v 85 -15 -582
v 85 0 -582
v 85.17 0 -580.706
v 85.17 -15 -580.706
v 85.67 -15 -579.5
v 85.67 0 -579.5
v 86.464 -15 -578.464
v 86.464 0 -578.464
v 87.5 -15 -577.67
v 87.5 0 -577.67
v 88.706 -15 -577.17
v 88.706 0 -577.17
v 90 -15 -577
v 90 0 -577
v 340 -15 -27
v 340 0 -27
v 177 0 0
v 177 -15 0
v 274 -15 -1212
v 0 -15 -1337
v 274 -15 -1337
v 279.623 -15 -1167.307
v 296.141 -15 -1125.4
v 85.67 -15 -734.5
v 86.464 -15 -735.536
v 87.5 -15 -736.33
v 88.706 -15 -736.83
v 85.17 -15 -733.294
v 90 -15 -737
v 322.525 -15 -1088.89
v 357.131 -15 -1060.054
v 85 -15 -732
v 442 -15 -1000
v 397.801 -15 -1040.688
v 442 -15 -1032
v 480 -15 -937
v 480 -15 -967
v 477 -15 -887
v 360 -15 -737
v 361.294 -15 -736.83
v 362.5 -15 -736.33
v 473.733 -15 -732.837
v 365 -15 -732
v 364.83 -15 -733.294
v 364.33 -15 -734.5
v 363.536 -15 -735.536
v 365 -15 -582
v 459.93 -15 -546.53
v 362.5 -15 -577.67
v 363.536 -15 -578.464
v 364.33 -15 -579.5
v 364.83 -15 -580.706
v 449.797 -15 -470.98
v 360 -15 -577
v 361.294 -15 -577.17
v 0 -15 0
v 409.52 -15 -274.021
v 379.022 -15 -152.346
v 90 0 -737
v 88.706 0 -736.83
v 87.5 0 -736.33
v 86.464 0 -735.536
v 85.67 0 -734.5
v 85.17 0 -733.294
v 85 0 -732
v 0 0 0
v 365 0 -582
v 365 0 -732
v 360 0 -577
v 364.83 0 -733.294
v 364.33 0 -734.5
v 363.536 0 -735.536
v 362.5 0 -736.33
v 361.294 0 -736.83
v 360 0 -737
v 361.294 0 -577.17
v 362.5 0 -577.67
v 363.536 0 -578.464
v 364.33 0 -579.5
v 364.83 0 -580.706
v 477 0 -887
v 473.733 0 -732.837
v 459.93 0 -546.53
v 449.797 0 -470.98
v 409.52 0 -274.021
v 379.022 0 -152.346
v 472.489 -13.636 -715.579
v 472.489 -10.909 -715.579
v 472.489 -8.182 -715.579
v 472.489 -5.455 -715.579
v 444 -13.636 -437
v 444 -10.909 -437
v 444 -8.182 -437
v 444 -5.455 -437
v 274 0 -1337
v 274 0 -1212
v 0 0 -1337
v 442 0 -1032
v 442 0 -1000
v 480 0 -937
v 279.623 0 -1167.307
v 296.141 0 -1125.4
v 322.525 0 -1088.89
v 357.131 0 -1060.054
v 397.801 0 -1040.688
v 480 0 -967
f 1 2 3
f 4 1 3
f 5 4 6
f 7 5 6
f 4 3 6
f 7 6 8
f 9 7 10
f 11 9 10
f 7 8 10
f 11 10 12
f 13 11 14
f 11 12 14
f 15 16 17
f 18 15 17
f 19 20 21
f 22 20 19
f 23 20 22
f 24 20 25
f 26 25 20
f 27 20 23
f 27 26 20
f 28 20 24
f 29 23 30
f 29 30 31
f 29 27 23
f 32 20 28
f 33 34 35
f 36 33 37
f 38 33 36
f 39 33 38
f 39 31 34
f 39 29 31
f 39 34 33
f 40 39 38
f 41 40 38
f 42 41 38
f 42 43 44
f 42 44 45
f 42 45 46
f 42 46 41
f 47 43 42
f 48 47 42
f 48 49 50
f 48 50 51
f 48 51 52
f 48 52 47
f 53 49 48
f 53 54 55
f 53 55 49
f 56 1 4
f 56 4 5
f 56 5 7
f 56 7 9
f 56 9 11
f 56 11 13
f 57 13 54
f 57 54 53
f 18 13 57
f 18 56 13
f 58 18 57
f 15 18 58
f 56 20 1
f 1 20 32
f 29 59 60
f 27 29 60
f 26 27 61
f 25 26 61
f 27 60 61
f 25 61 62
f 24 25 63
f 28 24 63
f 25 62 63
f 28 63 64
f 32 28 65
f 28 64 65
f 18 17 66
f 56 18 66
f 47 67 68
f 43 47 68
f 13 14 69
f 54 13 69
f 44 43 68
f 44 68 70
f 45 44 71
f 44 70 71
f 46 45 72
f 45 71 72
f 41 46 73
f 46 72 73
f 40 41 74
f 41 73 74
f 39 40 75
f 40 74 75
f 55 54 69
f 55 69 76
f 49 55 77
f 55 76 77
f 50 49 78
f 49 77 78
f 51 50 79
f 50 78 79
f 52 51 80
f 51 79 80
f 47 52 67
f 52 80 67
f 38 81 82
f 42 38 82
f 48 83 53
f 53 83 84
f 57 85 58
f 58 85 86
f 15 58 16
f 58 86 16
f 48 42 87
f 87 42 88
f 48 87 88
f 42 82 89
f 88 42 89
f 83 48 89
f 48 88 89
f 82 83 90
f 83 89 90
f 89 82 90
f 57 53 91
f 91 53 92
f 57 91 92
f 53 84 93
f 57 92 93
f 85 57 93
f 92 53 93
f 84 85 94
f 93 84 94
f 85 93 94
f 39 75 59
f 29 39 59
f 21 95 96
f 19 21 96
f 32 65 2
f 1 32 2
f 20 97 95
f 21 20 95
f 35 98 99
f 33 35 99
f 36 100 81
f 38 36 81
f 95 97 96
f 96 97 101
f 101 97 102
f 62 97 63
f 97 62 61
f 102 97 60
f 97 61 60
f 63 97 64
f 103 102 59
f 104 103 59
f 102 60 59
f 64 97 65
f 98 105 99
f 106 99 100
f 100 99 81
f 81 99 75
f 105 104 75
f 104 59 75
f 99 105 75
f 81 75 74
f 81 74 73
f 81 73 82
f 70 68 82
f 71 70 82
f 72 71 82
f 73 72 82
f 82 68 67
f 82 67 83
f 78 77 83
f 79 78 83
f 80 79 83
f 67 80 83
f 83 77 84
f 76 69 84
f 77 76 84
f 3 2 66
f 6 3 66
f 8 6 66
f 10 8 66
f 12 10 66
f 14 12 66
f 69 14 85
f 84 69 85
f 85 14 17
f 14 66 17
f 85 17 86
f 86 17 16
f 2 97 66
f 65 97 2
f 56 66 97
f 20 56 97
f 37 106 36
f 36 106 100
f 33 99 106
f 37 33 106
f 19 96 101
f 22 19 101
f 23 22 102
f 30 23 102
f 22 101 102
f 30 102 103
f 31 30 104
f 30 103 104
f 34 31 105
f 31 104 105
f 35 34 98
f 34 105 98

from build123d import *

# Parameters (mm, degrees)
F1_DEPTH = 15


with BuildPart() as f1:
    # F0 (on Front) → F1 (new body)
    with BuildSketch(Plane.XZ):
        with BuildLine():
            Line((177, 0), (0, 0))
            Line((0, 0), (0, -1337))
            Line((0, -1337), (274, -1337))
            Line((274, -1337), (274, -1212))
            ThreePointArc((274, -1212), (322.5253137442, -1088.8902928279), (442, -1032))
            Line((442, -1032), (442, -1000))
            Line((442, -1000), (480, -967))
            Line((480, -967), (480, -937))
            Line((480, -937), (477, -887))
            add(Edge.make_bspline(
                [(477, -887), (477.3409901345, -865.6929372181), (477.0797844675, -851.0610734518), (476.1022594588, -737.3138139423), (476.5777735361, -793.1899508202), (474.0967013355, -723.7578035301), (464.8329395432, -637.3258006514), (461.2628948716, -536.660924146), (443.9915396348, -436.9186876346), (426.5757756979, -336.5383755873), (399.3587210867, -237.3522036261), (375.4775408132, -133.8744354339), (355.455463807, -69.1251180104), (340, -27)],
                knots=[0, 0, 0, 0, 0.0728496243, 0.1620736999, 0.2013801511, 0.2662309643, 0.3694203367, 0.4725712376, 0.576170853, 0.6801132511, 0.7847115324, 0.8893098137, 1, 1, 1, 1], degree=3))
            Line((340, -27), (177, 0))
        make_face()
        with BuildLine():
            ThreePointArc((85, -582), (86.4644660941, -578.4644660941), (90, -577))
            Line((90, -577), (360, -577))
            ThreePointArc((360, -577), (363.5355339059, -578.4644660941), (365, -582))
            Line((365, -582), (365, -732))
            ThreePointArc((365, -732), (363.5355339059, -735.5355339059), (360, -737))
            Line((360, -737), (90, -737))
            ThreePointArc((90, -737), (86.4644660941, -735.5355339059), (85, -732))
            Line((85, -732), (85, -582))
        make_face(mode=Mode.SUBTRACT)
    extrude(amount=F1_DEPTH)


solid = f1.part
